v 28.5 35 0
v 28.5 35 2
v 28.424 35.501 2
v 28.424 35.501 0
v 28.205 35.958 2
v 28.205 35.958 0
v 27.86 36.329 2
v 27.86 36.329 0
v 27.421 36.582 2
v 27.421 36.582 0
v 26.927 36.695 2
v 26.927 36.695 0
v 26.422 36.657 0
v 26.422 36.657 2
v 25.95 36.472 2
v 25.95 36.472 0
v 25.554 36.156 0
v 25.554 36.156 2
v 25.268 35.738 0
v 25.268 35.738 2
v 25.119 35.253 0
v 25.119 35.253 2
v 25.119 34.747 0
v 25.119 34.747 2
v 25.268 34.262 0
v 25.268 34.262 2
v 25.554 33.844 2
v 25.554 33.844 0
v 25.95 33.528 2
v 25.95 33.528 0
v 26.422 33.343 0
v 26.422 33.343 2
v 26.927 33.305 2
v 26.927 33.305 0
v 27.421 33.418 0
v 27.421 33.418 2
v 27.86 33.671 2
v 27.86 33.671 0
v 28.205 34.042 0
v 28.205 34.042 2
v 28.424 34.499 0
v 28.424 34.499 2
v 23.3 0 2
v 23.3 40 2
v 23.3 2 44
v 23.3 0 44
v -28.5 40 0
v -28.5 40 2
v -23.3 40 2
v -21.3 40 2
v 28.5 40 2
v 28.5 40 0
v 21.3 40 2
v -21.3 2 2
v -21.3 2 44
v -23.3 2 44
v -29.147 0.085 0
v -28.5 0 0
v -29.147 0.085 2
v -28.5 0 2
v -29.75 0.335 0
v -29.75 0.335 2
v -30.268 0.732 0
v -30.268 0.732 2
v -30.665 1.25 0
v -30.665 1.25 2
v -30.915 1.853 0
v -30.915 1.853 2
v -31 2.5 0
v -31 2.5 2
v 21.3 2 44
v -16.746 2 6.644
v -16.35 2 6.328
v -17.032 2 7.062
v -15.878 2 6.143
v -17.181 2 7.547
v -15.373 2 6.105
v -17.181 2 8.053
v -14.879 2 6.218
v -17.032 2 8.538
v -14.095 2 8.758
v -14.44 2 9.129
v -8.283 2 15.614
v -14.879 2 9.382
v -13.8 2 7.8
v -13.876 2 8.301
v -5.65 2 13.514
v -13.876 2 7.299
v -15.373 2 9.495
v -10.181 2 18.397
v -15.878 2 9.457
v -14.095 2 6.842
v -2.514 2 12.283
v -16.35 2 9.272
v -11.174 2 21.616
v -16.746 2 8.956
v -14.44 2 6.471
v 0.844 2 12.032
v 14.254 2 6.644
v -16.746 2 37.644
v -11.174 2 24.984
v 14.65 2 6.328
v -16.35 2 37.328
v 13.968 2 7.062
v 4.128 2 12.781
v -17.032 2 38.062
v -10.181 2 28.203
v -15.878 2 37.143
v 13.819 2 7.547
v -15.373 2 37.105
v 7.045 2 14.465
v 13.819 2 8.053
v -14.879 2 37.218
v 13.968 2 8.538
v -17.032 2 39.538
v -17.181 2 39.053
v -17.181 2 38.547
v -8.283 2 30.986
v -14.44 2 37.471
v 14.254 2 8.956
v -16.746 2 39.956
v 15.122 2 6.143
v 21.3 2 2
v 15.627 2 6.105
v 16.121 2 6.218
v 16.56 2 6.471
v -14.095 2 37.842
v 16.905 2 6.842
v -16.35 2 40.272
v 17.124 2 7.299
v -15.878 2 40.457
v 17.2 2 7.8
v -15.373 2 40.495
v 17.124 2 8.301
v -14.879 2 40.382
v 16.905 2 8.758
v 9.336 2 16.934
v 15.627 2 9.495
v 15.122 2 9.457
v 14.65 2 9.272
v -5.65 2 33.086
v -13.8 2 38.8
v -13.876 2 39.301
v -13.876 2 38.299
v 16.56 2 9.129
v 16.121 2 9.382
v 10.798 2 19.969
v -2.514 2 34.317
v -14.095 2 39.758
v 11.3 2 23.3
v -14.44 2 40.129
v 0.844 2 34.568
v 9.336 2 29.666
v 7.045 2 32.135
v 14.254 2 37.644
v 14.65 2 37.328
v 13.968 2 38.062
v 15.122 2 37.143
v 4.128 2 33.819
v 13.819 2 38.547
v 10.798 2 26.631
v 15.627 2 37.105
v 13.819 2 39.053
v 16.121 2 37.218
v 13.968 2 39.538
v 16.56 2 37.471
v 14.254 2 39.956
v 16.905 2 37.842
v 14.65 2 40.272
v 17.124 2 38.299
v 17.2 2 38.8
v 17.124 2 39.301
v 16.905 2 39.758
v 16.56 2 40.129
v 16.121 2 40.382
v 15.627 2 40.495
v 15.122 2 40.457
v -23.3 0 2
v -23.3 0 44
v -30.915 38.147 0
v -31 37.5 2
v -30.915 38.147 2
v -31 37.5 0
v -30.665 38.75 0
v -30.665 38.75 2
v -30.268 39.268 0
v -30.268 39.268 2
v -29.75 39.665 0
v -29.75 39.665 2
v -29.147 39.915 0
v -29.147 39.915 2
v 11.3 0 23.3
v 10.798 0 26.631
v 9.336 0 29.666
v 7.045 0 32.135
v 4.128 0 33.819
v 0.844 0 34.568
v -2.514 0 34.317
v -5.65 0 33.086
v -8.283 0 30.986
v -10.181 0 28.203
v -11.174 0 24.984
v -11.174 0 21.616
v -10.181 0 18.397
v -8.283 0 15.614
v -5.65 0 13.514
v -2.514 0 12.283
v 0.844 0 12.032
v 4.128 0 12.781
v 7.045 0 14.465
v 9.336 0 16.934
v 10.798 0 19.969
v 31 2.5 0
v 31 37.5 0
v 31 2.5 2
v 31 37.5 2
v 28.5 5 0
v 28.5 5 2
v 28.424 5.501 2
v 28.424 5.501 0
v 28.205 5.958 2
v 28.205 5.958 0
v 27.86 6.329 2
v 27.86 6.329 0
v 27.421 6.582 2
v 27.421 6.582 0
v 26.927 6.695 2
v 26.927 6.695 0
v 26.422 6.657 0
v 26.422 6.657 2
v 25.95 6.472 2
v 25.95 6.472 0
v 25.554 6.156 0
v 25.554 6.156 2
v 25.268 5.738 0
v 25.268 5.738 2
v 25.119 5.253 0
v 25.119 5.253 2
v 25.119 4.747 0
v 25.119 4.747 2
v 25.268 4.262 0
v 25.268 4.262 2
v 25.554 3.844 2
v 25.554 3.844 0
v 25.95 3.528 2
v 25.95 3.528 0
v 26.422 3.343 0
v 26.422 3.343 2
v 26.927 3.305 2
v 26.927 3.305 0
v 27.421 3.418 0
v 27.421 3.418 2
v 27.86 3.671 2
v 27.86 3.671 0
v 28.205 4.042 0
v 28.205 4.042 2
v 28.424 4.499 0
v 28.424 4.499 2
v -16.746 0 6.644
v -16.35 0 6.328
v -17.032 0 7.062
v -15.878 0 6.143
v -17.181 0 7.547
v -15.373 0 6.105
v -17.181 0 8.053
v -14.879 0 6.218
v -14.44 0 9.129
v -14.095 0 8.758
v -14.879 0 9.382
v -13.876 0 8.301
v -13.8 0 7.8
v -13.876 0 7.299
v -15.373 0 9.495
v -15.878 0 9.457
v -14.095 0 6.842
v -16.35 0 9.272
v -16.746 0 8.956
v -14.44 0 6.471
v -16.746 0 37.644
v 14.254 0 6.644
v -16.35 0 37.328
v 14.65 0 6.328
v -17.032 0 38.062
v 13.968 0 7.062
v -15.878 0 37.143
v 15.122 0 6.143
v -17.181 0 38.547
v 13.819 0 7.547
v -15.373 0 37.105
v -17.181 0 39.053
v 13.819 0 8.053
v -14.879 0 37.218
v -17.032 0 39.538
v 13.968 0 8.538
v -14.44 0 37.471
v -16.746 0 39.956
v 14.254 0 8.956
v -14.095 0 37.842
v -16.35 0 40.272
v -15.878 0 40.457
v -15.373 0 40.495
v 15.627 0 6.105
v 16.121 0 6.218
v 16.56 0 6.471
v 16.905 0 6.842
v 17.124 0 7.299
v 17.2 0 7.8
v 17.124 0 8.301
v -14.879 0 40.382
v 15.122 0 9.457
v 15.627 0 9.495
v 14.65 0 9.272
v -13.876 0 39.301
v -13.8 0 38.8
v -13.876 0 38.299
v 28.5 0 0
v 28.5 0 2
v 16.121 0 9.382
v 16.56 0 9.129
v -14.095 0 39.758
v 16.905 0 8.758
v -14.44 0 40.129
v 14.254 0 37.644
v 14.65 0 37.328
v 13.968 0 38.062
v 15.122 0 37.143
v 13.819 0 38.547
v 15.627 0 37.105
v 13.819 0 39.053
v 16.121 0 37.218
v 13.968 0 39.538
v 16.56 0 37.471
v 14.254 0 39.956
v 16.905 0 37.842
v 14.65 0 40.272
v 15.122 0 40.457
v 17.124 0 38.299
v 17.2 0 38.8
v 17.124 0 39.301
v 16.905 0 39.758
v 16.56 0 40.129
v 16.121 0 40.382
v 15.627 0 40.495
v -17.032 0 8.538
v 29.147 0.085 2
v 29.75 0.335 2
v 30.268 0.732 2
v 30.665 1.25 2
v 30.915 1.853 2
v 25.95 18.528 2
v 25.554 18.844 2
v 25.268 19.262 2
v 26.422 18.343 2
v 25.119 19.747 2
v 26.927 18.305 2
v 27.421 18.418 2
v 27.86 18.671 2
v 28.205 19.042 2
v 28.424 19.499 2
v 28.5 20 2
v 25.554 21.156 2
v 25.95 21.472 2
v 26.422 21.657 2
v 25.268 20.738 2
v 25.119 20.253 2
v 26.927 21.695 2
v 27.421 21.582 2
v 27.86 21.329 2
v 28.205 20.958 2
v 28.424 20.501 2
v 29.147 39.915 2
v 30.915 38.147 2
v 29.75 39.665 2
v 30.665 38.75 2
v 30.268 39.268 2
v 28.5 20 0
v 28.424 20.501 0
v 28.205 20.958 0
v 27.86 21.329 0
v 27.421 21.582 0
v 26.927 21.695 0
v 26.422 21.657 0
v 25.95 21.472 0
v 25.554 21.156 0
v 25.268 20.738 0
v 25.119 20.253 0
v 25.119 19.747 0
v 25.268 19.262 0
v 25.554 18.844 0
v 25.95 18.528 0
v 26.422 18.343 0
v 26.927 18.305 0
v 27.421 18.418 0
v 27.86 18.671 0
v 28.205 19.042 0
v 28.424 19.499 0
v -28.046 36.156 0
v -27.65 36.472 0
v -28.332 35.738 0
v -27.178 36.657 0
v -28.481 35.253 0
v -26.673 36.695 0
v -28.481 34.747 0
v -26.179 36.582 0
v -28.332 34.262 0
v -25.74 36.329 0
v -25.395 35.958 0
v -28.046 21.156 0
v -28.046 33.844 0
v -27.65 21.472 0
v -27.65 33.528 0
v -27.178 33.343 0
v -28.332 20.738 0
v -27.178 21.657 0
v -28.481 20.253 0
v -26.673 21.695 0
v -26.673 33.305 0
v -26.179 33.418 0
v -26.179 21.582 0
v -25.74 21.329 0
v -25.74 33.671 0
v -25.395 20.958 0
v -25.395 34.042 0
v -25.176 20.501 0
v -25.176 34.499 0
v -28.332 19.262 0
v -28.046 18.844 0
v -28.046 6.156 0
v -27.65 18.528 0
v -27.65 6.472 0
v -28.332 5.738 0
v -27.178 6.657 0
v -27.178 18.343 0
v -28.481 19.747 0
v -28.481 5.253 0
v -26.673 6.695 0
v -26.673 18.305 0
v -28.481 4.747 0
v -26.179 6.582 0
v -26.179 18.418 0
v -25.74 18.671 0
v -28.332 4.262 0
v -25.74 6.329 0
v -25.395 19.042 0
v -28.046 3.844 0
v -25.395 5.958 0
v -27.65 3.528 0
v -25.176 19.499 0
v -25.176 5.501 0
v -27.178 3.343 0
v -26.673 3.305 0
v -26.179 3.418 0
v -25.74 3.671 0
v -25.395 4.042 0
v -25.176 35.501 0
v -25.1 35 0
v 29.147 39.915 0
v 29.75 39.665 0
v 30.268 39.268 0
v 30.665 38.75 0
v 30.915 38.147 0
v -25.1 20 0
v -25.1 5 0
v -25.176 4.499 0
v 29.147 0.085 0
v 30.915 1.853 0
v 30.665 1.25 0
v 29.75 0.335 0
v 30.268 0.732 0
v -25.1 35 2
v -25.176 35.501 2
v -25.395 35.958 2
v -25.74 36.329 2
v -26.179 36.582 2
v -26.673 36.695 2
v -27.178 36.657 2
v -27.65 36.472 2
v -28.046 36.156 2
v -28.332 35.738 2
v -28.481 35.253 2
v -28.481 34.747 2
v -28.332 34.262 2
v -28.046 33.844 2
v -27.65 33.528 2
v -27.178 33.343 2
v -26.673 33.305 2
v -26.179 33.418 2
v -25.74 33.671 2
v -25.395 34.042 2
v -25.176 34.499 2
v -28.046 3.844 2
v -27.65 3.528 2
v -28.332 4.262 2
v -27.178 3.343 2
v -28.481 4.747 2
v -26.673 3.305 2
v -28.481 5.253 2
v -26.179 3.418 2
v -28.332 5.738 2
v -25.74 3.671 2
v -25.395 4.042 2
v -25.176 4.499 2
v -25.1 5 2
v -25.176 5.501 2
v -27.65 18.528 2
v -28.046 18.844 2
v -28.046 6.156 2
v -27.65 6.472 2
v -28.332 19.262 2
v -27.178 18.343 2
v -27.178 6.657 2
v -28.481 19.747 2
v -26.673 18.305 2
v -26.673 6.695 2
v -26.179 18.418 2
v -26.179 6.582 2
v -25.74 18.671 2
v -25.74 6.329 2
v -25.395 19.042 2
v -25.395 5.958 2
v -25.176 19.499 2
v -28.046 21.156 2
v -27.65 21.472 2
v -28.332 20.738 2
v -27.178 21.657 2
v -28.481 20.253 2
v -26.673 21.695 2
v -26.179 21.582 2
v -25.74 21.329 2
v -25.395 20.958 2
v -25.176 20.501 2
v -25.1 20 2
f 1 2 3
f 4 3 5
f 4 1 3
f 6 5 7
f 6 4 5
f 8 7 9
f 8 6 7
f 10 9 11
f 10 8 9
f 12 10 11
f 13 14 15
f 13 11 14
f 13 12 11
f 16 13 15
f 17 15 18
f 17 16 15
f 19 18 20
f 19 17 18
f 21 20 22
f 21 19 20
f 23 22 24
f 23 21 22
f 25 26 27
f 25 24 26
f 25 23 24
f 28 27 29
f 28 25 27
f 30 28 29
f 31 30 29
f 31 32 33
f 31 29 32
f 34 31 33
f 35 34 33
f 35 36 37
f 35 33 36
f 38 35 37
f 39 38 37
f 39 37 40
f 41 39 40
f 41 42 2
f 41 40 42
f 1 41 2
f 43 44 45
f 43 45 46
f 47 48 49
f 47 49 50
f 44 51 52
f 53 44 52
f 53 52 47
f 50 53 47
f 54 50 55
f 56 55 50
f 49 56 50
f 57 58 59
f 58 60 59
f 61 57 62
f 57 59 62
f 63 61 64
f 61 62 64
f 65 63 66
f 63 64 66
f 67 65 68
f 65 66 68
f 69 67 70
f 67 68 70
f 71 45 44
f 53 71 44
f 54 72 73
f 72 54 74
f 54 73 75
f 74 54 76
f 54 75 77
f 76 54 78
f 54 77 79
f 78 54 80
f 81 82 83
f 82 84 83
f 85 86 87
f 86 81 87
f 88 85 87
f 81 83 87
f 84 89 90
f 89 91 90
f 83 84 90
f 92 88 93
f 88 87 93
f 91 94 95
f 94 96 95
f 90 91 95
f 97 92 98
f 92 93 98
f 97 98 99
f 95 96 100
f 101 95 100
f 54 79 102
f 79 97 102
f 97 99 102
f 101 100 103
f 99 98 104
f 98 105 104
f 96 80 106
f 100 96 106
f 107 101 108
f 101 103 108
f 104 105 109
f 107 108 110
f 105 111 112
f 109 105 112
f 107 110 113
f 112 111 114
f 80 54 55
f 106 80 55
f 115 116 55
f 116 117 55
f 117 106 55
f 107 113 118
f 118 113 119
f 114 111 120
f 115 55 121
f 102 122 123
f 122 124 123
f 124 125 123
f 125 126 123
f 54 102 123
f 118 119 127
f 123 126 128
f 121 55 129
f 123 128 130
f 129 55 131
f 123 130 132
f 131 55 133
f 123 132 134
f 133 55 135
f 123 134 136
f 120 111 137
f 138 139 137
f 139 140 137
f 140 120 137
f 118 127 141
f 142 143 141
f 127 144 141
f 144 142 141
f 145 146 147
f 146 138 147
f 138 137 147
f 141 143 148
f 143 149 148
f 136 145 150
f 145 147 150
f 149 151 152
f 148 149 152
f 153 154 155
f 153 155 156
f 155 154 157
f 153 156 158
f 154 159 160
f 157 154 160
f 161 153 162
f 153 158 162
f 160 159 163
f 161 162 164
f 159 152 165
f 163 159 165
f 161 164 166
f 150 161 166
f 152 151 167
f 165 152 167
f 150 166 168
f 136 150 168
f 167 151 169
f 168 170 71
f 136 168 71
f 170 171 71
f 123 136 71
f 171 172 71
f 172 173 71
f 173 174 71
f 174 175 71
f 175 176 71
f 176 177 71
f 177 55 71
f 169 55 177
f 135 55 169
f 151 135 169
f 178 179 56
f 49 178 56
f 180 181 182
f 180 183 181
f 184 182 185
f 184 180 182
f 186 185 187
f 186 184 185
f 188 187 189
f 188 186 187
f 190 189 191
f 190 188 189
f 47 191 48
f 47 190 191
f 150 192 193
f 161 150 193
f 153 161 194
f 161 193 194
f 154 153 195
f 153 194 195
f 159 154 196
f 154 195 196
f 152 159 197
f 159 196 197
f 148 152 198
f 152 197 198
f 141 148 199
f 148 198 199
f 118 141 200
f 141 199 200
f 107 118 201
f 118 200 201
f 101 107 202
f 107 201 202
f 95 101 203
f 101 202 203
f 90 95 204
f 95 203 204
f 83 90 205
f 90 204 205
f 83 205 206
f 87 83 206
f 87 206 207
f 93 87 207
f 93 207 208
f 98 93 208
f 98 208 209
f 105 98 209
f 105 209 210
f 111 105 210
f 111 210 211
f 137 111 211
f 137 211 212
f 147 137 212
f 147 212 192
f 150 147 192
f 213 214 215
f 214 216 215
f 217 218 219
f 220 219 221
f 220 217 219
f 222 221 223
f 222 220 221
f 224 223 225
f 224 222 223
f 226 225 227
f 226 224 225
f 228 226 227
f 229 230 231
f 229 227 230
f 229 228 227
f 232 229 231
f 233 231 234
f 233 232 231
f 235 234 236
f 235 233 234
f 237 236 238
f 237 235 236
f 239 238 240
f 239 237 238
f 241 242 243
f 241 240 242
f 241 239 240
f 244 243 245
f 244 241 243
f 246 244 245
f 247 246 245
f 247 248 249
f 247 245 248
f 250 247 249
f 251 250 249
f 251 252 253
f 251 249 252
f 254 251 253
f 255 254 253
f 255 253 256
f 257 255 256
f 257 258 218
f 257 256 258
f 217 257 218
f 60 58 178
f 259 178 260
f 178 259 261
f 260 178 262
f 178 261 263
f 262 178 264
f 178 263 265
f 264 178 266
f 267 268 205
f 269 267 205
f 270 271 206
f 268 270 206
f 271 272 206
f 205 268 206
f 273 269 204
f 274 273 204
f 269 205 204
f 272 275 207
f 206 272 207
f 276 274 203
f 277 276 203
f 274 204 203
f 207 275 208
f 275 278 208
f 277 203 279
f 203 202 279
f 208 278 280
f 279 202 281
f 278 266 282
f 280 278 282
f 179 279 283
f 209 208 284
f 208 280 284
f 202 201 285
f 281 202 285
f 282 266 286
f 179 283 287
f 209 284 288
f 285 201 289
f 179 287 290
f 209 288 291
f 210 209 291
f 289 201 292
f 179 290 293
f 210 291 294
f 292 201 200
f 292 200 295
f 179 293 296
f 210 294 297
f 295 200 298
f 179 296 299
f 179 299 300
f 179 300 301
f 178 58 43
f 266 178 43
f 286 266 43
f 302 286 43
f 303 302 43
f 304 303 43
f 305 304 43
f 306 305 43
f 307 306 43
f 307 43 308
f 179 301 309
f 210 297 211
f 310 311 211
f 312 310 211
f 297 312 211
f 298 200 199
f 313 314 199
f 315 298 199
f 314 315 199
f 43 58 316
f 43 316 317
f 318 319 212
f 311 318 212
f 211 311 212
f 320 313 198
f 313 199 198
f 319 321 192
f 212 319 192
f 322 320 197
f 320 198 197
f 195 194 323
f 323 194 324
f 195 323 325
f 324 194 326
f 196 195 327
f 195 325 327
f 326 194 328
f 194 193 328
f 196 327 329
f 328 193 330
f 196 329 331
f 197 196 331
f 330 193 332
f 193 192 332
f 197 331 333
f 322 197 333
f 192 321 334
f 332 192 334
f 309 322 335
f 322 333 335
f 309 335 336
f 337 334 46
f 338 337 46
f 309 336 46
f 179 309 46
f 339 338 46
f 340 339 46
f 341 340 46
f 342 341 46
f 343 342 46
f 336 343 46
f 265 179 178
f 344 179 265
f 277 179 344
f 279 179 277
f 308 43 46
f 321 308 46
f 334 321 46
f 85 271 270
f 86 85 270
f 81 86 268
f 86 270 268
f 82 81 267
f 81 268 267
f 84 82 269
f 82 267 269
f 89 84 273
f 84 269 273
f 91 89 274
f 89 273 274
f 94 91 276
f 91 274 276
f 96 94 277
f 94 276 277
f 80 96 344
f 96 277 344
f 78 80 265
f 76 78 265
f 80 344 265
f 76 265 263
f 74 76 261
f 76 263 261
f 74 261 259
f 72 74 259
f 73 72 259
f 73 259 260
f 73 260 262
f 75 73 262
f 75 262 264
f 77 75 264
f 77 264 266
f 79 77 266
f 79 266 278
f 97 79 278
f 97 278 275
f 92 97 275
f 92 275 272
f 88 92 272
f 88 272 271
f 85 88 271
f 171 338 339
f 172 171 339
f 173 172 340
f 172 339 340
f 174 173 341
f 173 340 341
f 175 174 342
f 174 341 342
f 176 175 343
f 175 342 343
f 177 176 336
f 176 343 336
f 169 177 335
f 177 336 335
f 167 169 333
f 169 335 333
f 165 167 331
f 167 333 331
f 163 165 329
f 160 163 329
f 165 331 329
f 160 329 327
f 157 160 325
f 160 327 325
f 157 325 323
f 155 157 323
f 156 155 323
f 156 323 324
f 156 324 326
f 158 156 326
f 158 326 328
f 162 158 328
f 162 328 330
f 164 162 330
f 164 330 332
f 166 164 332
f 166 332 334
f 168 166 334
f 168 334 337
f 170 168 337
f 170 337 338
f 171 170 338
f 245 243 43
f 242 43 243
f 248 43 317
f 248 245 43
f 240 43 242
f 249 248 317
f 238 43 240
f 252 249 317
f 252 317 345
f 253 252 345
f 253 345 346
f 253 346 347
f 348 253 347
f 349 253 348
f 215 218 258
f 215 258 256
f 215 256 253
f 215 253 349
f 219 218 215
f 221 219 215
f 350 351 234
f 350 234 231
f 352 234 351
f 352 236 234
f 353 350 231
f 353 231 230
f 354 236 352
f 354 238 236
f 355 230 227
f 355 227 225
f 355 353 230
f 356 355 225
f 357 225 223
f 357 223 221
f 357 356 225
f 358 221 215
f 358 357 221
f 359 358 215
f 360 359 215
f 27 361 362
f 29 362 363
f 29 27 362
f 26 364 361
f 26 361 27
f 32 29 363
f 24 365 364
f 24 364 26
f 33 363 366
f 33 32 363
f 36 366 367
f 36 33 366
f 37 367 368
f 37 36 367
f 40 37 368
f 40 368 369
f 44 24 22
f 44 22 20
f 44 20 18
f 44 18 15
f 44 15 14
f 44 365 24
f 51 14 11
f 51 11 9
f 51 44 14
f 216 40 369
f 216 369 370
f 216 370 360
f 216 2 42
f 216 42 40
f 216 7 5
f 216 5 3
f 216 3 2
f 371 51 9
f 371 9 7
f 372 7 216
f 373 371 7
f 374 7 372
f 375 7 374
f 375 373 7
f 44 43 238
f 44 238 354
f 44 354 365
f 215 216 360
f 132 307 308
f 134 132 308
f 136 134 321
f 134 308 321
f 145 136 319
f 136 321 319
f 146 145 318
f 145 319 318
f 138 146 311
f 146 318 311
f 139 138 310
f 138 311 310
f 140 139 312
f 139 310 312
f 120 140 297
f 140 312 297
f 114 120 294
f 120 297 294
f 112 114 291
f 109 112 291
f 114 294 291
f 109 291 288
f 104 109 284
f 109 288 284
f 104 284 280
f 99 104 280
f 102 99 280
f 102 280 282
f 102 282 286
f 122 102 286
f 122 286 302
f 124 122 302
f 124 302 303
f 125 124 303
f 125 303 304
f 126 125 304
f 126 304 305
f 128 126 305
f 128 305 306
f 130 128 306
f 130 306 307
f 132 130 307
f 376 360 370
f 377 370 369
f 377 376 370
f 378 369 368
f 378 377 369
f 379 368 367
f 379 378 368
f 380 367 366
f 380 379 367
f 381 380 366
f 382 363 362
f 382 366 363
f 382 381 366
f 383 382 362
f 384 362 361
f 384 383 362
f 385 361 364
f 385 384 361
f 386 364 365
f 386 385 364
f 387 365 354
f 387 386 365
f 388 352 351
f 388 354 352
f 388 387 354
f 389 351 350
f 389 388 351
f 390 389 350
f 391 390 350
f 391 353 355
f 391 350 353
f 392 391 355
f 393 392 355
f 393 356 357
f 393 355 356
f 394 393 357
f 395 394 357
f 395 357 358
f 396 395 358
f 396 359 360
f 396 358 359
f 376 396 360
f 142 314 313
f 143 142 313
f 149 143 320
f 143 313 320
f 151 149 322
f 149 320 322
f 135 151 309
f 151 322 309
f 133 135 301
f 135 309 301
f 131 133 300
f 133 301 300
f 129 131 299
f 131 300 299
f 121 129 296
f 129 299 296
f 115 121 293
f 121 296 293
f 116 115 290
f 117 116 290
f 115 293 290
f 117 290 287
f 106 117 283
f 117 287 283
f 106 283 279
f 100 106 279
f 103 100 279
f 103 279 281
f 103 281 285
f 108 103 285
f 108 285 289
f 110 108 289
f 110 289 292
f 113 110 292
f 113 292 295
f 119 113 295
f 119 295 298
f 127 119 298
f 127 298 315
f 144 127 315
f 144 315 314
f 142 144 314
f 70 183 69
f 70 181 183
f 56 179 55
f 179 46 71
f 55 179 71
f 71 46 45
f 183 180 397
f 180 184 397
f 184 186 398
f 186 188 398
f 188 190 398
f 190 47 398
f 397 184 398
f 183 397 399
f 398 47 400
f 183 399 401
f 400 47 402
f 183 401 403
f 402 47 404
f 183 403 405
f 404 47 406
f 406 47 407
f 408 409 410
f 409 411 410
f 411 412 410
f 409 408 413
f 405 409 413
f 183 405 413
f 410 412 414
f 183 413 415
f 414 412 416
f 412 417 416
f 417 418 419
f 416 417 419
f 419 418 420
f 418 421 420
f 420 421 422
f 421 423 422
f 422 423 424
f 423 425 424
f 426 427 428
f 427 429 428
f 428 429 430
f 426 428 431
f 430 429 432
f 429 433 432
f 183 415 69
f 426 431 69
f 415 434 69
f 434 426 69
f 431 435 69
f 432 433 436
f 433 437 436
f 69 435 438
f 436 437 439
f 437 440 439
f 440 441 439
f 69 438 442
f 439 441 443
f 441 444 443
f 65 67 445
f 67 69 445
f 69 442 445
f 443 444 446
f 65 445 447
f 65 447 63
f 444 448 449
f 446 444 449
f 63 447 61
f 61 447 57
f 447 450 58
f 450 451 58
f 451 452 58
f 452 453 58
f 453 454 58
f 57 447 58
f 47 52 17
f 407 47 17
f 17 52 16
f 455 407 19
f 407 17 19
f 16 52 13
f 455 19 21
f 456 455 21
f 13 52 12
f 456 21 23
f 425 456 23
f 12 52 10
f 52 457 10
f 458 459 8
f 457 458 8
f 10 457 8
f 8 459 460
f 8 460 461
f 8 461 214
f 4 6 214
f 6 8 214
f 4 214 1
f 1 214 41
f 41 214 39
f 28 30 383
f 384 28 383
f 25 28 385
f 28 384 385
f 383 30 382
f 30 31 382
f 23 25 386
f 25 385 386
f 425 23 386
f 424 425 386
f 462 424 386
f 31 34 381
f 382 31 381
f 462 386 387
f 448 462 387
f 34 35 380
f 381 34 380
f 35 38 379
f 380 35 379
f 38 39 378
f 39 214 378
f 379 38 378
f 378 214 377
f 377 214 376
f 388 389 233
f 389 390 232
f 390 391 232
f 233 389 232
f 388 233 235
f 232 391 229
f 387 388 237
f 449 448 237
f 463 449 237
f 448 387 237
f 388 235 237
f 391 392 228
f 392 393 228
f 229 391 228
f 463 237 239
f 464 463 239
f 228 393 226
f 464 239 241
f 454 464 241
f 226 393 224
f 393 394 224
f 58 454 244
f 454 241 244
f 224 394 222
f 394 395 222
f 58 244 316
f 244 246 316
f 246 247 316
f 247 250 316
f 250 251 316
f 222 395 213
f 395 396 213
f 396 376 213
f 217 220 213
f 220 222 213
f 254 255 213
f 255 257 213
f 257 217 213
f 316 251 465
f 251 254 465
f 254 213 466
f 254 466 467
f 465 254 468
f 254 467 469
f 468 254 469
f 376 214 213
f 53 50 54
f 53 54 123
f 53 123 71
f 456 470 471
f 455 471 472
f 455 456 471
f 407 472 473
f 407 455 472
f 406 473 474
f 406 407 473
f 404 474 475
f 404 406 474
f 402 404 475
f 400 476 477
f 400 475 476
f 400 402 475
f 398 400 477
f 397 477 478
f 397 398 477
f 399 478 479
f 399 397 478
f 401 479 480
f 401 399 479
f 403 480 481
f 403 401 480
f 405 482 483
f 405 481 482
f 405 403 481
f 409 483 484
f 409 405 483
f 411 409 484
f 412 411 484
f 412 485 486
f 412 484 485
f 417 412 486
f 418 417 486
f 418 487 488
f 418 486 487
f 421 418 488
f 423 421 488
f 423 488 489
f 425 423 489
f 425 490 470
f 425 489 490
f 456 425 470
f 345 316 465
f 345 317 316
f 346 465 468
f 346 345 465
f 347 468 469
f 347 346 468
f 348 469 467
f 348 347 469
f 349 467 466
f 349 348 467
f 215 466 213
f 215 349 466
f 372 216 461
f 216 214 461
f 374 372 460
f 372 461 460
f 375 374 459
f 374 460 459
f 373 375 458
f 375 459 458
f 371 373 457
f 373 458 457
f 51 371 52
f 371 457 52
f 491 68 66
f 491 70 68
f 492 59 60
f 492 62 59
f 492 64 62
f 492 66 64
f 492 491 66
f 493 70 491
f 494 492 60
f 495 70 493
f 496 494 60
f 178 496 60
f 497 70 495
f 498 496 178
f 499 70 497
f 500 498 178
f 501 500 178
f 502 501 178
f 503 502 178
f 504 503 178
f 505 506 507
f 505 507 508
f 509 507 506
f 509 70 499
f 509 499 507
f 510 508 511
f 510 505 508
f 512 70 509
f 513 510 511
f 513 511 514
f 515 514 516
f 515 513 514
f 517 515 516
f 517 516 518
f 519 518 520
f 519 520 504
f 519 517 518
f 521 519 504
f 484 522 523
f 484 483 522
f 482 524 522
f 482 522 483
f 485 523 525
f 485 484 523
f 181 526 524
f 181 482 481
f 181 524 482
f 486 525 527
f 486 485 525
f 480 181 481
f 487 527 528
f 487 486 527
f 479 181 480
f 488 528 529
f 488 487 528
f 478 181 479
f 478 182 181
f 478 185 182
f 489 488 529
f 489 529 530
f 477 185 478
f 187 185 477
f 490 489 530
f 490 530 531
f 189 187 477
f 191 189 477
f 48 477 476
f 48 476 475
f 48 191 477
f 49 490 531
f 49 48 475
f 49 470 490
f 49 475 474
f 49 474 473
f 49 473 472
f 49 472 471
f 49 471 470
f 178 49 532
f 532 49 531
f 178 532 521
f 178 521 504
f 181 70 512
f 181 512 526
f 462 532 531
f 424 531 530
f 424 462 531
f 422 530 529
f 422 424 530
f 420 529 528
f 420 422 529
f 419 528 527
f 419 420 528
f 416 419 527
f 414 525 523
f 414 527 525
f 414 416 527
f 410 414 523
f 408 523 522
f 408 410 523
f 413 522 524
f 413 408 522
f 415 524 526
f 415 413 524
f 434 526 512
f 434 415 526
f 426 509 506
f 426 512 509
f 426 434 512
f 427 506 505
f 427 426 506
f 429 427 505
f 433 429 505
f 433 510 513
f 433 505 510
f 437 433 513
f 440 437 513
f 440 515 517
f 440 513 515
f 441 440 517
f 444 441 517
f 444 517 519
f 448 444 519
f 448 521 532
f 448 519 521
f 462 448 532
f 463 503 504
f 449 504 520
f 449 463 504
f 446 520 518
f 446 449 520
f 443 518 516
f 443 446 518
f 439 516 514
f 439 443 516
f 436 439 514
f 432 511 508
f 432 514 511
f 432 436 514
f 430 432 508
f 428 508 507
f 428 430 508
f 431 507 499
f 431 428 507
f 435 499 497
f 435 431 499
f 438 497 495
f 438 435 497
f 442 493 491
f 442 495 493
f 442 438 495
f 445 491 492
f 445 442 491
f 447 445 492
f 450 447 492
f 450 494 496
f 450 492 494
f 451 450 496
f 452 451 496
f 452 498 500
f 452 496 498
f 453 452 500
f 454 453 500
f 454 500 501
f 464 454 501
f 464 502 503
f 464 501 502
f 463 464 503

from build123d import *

# Parameters (mm, degrees)
PAD_DEPTH       = 31
POCKET_DEPTH    = 42
SKETCH002_R     = 1.7
POCKET001_DEPTH = 44.001
SKETCH003_R     = 1.7
SKETCH003_R_2   = 11.3
POCKET002_DEPTH = 40.001
FILLET_R        = 2.5


with BuildPart() as part:
    # Sketch → Pad (new body, symmetric)
    with BuildSketch(Plane.YZ):
        Polygon((0, 44), (2, 44), (40, 2), (40, 0), (0, 0), align=None)
    extrude(amount=PAD_DEPTH, both=True)

    # Sketch001 → Pocket (cut)
    with BuildSketch(Plane.XY.offset(44)):
        Polygon((-32, 42), (-32, -1), (-23.3, -1), (-23.3, 41), (-21.3, 41), (-21.3, 2), (21.3, 2), (21.3, 41), (23.3, 41), (23.3, -1), (32, -1), (32, 42), align=None)
    extrude(amount=-POCKET_DEPTH, mode=Mode.SUBTRACT)

    # Sketch002 → Pocket001 (cut, through all)
    with BuildSketch(Plane.XY):
        with Locations((-26.8, 35)):
            Circle(SKETCH002_R)
        with Locations((-26.8, 20)):
            Circle(SKETCH002_R)
        with Locations((-26.8, 5)):
            Circle(SKETCH002_R)
        with Locations((26.8, 35)):
            Circle(SKETCH002_R)
        with Locations((26.8, 20)):
            Circle(SKETCH002_R)
        with Locations((26.8, 5)):
            Circle(SKETCH002_R)
    extrude(amount=POCKET001_DEPTH, mode=Mode.SUBTRACT)

    # Sketch003 → Pocket002 (cut, through all)
    with BuildSketch(Plane.XZ):
        with Locations((-15.5, 38.8)):
            Circle(SKETCH003_R)
        with Locations((15.5, 38.8)):
            Circle(SKETCH003_R)
        with Locations((15.5, 7.8)):
            Circle(SKETCH003_R)
        with Locations((-15.5, 7.8)):
            Circle(SKETCH003_R)
        with Locations((0, 23.3)):
            Circle(SKETCH003_R_2)
    extrude(amount=-POCKET002_DEPTH, mode=Mode.SUBTRACT)

    # Fillet
    fillet_edges = [part.edges().sort_by_distance(p)[0] for p in [
        (31, 40, 1),
        (31, 0, 1),
        (-31, 40, 1),
        (-31, 0, 1),
    ]]
    fillet(fillet_edges, radius=FILLET_R)


solid = part.part
